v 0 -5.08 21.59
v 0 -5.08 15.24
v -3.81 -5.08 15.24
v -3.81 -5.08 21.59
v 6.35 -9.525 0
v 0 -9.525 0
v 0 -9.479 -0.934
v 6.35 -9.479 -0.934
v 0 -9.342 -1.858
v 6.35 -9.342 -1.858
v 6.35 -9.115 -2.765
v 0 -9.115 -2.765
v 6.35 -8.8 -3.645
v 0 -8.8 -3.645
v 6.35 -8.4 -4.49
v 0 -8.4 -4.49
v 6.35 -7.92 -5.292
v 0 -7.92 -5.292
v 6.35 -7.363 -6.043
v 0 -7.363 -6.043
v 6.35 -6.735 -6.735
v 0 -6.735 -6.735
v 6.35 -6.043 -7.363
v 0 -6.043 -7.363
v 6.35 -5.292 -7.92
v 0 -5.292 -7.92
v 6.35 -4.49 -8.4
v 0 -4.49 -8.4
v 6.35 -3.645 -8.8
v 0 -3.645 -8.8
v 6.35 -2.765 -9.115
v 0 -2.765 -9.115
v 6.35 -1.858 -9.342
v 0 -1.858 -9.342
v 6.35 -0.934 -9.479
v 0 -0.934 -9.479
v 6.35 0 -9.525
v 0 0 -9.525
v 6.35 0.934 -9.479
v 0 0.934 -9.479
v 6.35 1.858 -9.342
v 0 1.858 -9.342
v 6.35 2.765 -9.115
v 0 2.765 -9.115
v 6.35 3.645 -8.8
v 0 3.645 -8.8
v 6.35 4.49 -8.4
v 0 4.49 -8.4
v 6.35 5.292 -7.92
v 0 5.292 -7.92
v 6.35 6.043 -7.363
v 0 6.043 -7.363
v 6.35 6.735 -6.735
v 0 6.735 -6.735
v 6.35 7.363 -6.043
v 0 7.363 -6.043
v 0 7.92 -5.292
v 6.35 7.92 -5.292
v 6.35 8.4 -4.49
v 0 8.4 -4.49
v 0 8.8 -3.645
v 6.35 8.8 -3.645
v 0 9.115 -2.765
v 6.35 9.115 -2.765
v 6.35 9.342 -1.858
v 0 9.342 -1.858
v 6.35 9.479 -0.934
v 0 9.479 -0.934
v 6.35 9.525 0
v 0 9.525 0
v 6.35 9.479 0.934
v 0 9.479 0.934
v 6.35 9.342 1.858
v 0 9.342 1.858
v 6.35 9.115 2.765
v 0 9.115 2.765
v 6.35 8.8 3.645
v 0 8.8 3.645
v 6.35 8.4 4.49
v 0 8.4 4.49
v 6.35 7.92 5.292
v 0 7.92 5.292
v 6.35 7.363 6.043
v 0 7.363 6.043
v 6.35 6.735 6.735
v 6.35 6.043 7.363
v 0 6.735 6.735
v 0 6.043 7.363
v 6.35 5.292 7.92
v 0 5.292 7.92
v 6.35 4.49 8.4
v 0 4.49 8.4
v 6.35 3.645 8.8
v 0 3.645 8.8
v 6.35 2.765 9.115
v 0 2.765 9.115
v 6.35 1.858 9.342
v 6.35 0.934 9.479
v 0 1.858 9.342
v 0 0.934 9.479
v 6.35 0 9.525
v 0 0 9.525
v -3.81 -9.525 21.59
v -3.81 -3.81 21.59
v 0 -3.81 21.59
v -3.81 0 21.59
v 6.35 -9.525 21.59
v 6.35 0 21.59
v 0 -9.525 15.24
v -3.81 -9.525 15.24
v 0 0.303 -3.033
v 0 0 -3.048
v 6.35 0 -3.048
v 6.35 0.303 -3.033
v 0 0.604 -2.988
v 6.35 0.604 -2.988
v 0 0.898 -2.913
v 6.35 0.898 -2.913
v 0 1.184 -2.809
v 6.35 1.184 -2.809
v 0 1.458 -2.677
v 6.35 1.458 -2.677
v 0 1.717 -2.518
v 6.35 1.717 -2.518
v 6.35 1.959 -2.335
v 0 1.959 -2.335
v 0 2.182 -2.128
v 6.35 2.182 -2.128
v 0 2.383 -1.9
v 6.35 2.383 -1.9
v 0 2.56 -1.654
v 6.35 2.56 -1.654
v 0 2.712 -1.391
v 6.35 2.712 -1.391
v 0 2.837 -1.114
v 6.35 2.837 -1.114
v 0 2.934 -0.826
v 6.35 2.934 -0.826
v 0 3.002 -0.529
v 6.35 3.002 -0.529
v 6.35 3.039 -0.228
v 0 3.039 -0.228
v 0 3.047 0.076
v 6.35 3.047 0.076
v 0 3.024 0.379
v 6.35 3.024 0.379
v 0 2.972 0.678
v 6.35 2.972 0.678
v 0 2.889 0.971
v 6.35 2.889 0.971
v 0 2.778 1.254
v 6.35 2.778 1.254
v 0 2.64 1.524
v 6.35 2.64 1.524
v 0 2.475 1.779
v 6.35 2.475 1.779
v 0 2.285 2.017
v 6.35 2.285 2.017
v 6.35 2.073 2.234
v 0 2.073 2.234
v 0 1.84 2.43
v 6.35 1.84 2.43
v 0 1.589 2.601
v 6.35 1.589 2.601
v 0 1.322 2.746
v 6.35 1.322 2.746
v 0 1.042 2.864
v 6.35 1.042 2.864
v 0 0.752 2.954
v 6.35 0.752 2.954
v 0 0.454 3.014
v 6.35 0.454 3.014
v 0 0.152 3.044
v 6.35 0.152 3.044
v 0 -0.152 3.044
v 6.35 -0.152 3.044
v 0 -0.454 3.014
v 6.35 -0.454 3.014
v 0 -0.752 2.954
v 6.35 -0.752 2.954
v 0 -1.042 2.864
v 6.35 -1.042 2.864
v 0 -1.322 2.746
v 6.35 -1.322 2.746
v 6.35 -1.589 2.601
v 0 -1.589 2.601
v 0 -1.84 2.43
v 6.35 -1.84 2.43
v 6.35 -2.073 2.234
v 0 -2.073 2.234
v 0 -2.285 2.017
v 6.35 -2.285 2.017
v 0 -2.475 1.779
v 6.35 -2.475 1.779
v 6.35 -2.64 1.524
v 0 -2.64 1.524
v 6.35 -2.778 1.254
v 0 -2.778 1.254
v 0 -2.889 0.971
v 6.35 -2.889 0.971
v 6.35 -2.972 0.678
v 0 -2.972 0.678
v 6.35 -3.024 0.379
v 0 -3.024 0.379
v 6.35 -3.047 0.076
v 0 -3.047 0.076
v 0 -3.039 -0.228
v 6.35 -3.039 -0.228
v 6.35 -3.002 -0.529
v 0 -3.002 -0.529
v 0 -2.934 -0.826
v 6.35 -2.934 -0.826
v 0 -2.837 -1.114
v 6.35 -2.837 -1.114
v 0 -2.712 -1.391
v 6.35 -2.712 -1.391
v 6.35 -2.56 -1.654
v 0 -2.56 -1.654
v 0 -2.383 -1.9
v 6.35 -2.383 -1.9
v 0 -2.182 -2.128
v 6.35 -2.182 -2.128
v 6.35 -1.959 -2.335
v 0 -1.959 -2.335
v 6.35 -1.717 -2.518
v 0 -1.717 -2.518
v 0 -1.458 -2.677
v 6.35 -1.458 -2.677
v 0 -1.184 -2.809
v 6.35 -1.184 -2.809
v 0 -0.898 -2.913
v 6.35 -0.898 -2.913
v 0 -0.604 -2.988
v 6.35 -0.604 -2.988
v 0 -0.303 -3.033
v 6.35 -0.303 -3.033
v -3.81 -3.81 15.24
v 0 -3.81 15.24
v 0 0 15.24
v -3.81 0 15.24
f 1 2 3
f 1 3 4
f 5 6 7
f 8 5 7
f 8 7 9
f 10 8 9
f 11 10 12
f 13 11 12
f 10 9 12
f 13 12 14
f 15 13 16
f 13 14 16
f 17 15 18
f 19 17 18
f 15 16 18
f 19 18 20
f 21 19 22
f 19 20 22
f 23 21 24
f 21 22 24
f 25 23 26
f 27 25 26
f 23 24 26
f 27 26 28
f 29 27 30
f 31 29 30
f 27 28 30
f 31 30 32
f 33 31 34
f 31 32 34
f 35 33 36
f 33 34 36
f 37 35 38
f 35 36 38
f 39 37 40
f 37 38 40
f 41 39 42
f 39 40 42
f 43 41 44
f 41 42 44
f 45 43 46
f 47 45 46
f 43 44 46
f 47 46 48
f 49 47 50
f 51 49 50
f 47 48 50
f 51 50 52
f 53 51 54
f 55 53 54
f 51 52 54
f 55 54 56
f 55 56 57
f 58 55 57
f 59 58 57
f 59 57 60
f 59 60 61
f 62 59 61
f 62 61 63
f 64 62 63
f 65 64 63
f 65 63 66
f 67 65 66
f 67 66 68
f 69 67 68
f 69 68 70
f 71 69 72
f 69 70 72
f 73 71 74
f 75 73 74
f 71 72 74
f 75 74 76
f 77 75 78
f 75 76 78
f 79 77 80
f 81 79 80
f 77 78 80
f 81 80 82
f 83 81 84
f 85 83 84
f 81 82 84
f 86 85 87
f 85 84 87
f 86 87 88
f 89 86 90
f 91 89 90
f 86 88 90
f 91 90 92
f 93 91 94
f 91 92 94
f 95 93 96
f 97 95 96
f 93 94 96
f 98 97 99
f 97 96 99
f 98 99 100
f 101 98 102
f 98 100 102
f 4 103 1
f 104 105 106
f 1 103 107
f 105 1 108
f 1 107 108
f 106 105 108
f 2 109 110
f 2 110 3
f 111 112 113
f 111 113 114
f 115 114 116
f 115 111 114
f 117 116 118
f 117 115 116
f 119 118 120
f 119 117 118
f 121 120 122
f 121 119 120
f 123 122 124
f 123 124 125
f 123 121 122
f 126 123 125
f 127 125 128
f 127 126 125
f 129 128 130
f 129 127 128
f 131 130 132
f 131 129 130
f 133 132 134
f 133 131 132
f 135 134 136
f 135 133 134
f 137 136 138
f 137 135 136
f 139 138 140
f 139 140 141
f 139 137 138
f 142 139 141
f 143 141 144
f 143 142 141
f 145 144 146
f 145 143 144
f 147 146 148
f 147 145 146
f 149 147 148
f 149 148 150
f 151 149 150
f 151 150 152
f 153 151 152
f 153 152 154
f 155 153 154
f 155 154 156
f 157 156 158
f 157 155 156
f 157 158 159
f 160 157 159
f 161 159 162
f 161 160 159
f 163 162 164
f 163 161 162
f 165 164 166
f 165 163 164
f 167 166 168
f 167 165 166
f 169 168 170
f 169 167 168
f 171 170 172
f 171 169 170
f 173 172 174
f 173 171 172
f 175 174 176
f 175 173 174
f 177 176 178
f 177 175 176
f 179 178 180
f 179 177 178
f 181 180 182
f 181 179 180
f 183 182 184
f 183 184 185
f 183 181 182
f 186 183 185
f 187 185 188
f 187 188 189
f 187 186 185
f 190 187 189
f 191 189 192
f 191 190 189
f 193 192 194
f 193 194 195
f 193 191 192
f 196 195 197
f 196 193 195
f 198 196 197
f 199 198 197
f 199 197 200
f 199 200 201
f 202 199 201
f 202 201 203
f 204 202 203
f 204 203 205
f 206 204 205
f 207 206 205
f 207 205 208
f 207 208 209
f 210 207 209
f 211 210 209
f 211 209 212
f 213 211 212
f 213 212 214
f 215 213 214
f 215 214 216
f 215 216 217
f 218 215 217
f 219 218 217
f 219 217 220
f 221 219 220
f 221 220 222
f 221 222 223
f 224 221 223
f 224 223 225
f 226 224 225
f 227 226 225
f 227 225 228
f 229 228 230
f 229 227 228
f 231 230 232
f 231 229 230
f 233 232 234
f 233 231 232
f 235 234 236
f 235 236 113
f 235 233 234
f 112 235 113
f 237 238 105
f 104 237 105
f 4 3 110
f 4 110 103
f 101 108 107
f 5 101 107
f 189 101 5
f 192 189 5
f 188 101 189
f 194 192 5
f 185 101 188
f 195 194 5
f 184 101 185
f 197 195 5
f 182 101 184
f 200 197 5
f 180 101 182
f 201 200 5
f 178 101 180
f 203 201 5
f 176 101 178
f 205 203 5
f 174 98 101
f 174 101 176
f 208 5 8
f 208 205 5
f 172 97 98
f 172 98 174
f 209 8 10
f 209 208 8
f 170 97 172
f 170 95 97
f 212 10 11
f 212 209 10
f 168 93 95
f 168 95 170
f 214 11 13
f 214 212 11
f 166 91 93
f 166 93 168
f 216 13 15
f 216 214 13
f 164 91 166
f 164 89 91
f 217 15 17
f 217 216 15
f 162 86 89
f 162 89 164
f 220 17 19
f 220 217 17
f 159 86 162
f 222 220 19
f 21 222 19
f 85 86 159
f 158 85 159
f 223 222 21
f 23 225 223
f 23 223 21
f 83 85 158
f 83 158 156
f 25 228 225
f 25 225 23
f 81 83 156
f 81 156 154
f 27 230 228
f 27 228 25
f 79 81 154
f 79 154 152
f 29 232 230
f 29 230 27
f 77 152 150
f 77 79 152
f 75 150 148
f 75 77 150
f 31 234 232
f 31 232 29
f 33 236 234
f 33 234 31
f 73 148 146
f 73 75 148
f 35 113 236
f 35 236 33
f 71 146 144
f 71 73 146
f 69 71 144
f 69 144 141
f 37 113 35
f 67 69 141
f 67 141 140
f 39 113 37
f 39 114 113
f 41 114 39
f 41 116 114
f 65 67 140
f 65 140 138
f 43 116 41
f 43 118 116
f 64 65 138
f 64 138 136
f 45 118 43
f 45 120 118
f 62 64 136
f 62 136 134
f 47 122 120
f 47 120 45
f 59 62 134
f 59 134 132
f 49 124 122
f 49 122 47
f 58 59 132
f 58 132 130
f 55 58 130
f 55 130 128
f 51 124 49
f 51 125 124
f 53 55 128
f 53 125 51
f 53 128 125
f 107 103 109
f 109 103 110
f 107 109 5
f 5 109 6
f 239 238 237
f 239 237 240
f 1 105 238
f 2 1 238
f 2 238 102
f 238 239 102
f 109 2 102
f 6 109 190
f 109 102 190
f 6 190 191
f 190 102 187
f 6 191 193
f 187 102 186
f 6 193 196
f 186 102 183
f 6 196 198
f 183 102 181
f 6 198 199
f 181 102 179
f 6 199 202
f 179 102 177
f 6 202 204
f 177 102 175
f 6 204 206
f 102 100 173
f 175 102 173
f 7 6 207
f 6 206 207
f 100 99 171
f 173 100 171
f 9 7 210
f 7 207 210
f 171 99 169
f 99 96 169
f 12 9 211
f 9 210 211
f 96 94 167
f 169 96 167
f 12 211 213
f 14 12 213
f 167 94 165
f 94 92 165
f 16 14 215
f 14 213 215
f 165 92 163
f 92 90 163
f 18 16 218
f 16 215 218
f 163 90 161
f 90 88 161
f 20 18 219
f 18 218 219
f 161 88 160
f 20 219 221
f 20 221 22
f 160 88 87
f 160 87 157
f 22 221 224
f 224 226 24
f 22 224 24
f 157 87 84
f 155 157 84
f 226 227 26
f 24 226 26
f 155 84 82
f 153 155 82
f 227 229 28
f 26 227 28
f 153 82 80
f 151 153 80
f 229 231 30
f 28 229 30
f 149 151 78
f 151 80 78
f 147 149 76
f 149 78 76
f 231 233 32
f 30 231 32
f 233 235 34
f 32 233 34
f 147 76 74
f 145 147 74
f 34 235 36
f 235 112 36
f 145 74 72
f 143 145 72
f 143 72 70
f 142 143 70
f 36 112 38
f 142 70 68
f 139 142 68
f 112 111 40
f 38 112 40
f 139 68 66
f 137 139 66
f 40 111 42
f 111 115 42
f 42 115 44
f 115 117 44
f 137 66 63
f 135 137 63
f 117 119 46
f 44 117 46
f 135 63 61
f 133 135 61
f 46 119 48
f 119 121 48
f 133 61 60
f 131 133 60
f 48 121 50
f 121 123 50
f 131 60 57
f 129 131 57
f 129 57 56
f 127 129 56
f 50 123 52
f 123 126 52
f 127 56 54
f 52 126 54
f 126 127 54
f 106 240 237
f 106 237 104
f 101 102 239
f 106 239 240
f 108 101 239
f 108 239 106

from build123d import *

# Parameters (mm, degrees)
SKETCH1_R           = 3.048
BOSS_EXTRUDE1_DEPTH = 6.35
SKETCH2_W           = 6.35
SKETCH2_H           = 3.81
SKETCH2_H_2         = 4.445
BOSS_EXTRUDE2_DEPTH = 3.81


with BuildPart() as part:
    # Sketch1 → Boss-Extrude1 (new body)
    with BuildSketch(Plane(origin=(0, 0, 0), x_dir=(0, 0, -1), z_dir=(1, 0, 0))):
        with BuildLine():
            ThreePointArc((0, -9.525), (6.735192091, 6.735192091), (-9.525, 0))
            Line((-9.525, 0), (-21.59, 0))
            Line((-21.59, 0), (-21.59, -9.525))
            Line((-21.59, -9.525), (0, -9.525))
        make_face()
        Circle(SKETCH1_R, mode=Mode.SUBTRACT)
    extrude(amount=BOSS_EXTRUDE1_DEPTH)

    # Sketch2 → Boss-Extrude2 (add)
    with BuildSketch(Plane.ZY):
        with Locations((18.415, -1.905)):
            Rectangle(SKETCH2_W, SKETCH2_H)
        with Locations((18.415, -7.3025)):
            Rectangle(SKETCH2_W, SKETCH2_H_2)
    extrude(amount=BOSS_EXTRUDE2_DEPTH)


solid = part.part
